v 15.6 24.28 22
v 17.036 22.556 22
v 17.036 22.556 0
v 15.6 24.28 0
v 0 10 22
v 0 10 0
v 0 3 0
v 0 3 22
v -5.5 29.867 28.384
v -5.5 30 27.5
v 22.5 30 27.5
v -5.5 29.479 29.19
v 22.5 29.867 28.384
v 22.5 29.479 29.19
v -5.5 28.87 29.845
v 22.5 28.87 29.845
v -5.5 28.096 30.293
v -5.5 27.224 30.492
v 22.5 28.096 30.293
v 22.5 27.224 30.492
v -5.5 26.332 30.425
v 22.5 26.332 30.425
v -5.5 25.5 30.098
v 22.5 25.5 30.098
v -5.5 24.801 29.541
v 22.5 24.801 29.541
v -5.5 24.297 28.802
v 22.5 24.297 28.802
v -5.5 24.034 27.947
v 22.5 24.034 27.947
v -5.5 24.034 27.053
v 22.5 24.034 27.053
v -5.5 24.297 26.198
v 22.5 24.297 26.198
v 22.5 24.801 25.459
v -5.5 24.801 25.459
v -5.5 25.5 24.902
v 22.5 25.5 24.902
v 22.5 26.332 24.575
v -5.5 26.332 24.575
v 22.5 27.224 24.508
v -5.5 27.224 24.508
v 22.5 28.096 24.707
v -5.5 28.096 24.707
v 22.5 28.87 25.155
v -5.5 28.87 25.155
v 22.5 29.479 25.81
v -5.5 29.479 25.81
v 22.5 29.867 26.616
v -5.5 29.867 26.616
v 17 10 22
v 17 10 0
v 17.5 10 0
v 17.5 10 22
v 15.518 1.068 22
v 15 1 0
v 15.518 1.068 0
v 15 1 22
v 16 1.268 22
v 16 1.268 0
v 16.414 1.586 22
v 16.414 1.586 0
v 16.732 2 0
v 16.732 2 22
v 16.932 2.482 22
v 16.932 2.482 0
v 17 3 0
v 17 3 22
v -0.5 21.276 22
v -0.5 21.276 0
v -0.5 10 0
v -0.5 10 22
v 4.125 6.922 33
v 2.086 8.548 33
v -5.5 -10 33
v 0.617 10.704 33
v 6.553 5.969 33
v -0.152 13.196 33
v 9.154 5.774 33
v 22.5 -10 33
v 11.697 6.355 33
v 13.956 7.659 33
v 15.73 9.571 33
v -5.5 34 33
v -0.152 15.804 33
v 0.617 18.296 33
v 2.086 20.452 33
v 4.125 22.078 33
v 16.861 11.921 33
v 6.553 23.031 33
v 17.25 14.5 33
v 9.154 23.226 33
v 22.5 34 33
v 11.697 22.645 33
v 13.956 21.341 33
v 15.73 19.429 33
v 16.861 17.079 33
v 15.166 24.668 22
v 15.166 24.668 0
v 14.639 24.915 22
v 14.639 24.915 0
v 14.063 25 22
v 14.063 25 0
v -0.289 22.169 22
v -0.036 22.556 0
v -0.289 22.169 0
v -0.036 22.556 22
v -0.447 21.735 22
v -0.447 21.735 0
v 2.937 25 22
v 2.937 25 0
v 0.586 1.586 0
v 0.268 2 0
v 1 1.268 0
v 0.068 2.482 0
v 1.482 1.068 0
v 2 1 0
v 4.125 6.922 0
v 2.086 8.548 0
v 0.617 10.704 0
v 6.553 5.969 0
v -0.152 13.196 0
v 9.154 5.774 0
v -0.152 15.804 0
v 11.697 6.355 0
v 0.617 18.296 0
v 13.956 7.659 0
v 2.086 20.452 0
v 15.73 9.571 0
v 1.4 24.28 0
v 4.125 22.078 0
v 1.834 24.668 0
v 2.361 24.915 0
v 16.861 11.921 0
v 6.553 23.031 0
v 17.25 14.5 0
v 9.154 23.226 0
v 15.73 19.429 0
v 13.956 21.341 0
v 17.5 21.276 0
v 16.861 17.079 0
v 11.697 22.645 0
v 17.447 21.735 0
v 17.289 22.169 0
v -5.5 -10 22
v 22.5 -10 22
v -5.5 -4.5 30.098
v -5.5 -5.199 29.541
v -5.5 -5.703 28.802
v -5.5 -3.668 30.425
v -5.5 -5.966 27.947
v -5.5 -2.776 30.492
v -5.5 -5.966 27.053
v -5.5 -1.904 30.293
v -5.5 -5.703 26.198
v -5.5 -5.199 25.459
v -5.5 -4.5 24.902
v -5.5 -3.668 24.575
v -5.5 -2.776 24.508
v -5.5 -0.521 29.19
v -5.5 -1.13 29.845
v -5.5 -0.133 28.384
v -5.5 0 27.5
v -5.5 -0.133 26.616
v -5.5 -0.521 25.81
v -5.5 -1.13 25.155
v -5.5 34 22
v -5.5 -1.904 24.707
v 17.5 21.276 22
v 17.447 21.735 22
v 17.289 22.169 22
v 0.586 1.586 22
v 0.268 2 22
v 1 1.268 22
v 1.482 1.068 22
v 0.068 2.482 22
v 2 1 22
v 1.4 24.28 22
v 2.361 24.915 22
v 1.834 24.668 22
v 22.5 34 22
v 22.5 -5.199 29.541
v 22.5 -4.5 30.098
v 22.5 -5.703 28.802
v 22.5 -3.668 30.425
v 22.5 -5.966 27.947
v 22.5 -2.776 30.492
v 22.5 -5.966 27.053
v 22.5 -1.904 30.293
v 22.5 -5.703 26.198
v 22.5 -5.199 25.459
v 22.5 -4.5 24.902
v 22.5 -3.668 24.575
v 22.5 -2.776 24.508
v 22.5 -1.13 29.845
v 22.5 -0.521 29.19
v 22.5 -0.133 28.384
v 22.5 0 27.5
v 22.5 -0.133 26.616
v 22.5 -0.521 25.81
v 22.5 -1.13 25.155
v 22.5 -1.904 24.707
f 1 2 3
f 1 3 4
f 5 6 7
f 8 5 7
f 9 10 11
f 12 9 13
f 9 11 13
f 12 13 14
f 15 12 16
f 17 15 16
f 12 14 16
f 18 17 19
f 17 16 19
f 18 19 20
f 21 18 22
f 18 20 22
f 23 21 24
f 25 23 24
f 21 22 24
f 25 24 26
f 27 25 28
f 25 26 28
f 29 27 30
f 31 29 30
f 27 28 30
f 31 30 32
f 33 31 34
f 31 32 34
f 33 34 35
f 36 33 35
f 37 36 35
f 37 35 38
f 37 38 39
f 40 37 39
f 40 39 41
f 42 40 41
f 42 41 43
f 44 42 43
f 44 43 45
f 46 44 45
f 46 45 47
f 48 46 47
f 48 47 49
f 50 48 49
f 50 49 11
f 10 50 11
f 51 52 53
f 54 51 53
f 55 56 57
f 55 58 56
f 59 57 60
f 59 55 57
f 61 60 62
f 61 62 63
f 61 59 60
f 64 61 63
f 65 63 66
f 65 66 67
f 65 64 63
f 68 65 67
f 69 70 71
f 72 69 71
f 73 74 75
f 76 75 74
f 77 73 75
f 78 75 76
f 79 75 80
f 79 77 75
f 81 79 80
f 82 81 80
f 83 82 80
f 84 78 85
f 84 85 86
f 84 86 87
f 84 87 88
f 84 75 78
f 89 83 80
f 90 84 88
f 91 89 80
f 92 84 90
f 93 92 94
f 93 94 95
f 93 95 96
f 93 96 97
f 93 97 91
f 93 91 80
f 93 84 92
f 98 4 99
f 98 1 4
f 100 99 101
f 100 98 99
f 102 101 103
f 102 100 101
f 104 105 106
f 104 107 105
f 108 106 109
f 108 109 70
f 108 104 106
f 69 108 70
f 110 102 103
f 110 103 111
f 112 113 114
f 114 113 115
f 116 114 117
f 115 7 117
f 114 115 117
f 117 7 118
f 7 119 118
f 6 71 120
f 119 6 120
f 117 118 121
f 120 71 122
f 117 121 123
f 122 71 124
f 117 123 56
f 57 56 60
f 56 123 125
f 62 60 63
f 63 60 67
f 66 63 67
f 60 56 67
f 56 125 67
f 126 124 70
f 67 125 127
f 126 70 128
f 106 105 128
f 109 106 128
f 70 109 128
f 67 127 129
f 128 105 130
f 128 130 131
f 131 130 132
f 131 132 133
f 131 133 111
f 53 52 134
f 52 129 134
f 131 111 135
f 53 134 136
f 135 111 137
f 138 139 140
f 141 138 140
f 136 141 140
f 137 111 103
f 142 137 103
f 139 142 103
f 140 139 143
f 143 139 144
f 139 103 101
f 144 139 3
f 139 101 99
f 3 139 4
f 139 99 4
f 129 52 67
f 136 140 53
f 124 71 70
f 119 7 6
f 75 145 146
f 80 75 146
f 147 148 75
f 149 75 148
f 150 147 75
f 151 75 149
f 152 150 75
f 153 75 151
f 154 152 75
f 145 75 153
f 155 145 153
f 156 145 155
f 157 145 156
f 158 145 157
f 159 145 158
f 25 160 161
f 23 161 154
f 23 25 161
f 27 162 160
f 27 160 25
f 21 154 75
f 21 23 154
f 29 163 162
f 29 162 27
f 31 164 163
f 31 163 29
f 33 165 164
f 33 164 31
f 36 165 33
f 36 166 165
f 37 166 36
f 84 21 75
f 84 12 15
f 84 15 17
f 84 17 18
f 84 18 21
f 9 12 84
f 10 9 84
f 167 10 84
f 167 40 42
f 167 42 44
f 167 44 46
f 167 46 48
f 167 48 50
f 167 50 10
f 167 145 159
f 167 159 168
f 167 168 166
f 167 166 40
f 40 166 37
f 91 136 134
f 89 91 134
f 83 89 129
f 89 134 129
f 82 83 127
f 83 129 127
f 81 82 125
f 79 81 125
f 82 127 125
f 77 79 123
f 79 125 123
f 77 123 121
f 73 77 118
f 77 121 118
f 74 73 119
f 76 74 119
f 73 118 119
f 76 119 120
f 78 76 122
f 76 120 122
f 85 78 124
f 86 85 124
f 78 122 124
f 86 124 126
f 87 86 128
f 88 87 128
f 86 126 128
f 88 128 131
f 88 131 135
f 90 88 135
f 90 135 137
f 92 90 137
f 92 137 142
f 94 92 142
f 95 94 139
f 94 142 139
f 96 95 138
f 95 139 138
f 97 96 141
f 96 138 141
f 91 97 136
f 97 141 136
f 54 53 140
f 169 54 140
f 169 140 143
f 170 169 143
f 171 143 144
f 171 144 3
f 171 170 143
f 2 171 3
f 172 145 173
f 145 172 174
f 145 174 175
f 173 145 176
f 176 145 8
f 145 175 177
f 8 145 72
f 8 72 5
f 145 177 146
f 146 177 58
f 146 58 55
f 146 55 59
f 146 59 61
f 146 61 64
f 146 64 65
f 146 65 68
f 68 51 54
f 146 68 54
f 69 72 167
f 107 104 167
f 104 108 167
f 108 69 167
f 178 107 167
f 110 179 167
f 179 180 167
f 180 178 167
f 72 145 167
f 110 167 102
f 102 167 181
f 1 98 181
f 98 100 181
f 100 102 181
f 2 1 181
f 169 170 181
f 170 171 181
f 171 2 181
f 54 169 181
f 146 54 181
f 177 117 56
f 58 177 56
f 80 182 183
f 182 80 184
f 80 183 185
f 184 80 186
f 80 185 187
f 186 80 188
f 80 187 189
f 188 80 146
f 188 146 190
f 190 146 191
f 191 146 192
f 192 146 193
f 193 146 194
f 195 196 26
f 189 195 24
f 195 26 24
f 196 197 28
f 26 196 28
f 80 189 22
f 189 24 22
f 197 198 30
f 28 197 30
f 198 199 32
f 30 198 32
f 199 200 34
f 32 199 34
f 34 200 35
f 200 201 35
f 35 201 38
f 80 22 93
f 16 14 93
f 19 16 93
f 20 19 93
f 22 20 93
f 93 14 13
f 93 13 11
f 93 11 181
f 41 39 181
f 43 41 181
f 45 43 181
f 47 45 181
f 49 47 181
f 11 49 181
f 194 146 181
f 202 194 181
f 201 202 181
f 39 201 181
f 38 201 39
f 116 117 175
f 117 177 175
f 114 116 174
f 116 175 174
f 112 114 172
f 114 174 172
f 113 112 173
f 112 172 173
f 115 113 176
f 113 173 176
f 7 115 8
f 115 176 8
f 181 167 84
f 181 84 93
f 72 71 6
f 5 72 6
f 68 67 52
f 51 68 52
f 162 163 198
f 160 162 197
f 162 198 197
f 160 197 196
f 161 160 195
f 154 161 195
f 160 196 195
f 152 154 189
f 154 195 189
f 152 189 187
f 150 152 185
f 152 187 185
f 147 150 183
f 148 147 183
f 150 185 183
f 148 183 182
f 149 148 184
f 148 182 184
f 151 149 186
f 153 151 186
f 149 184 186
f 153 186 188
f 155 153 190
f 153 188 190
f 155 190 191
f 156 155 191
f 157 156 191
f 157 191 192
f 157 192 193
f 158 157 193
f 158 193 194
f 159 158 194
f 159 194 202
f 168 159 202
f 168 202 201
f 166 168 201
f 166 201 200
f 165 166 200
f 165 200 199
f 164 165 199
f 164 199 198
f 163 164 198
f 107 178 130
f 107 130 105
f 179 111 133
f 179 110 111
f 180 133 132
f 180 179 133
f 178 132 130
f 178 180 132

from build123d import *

# Parameters (mm, degrees)
PAD_DEPTH       = 22
BOX_W           = 28
BOX_H           = 44
BOX_DEPTH       = 11
SKETCH001_R     = 8.75
POCKET_DEPTH    = 33
FILLET_R        = 2
SKETCH003_R     = 3
POCKET002_DEPTH = 28.001


with BuildPart() as part:
    # Sketch → Pad (new body)
    with BuildSketch(Plane.XY):
        Polygon((0, 1), (17, 1), (17, 10), (17.5, 10), (17.5, 22), (15, 25), (2, 25), (-0.5, 22), (-0.5, 10), (0, 10), align=None)
    extrude(amount=PAD_DEPTH)

    # Box → Box (join)
    with BuildSketch(Plane(origin=(-5.5, -10, 22), x_dir=(1, 0, 0), z_dir=(0, 0, 1))):
        with Locations((14, 22)):
            Rectangle(BOX_W, BOX_H)
    extrude(amount=BOX_DEPTH)

    # Sketch001 (on Face4 of Box) → Pocket (cut)
    with BuildSketch(Plane(origin=(-5.5, -10, 0), x_dir=(1, 0, 0), z_dir=(0, 0, -1))):
        with Locations((14, -24.5)):
            Circle(SKETCH001_R)
    extrude(amount=-POCKET_DEPTH, mode=Mode.SUBTRACT)

    # Fillet
    fillet_edges = [part.edges().sort_by_distance(p)[0] for p in [
        (17.5, 22, 11),
        (15, 25, 11),
        (2, 25, 11),
        (17, 1, 11),
        (0, 1, 11),
        (-0.5, 22, 11),
    ]]
    fillet(fillet_edges, radius=FILLET_R)

    # Sketch003 (on Face23 of Fillet) → Pocket002 (cut, through all)
    with BuildSketch(Plane(origin=(22.5, -10, 22), x_dir=(0, 1, 0), z_dir=(1, 0, 0))):
        with Locations((7, 5.5)):
            Circle(SKETCH003_R)
        with Locations((37, 5.5)):
            Circle(SKETCH003_R)
    extrude(amount=-POCKET002_DEPTH, mode=Mode.SUBTRACT)


solid = part.part
